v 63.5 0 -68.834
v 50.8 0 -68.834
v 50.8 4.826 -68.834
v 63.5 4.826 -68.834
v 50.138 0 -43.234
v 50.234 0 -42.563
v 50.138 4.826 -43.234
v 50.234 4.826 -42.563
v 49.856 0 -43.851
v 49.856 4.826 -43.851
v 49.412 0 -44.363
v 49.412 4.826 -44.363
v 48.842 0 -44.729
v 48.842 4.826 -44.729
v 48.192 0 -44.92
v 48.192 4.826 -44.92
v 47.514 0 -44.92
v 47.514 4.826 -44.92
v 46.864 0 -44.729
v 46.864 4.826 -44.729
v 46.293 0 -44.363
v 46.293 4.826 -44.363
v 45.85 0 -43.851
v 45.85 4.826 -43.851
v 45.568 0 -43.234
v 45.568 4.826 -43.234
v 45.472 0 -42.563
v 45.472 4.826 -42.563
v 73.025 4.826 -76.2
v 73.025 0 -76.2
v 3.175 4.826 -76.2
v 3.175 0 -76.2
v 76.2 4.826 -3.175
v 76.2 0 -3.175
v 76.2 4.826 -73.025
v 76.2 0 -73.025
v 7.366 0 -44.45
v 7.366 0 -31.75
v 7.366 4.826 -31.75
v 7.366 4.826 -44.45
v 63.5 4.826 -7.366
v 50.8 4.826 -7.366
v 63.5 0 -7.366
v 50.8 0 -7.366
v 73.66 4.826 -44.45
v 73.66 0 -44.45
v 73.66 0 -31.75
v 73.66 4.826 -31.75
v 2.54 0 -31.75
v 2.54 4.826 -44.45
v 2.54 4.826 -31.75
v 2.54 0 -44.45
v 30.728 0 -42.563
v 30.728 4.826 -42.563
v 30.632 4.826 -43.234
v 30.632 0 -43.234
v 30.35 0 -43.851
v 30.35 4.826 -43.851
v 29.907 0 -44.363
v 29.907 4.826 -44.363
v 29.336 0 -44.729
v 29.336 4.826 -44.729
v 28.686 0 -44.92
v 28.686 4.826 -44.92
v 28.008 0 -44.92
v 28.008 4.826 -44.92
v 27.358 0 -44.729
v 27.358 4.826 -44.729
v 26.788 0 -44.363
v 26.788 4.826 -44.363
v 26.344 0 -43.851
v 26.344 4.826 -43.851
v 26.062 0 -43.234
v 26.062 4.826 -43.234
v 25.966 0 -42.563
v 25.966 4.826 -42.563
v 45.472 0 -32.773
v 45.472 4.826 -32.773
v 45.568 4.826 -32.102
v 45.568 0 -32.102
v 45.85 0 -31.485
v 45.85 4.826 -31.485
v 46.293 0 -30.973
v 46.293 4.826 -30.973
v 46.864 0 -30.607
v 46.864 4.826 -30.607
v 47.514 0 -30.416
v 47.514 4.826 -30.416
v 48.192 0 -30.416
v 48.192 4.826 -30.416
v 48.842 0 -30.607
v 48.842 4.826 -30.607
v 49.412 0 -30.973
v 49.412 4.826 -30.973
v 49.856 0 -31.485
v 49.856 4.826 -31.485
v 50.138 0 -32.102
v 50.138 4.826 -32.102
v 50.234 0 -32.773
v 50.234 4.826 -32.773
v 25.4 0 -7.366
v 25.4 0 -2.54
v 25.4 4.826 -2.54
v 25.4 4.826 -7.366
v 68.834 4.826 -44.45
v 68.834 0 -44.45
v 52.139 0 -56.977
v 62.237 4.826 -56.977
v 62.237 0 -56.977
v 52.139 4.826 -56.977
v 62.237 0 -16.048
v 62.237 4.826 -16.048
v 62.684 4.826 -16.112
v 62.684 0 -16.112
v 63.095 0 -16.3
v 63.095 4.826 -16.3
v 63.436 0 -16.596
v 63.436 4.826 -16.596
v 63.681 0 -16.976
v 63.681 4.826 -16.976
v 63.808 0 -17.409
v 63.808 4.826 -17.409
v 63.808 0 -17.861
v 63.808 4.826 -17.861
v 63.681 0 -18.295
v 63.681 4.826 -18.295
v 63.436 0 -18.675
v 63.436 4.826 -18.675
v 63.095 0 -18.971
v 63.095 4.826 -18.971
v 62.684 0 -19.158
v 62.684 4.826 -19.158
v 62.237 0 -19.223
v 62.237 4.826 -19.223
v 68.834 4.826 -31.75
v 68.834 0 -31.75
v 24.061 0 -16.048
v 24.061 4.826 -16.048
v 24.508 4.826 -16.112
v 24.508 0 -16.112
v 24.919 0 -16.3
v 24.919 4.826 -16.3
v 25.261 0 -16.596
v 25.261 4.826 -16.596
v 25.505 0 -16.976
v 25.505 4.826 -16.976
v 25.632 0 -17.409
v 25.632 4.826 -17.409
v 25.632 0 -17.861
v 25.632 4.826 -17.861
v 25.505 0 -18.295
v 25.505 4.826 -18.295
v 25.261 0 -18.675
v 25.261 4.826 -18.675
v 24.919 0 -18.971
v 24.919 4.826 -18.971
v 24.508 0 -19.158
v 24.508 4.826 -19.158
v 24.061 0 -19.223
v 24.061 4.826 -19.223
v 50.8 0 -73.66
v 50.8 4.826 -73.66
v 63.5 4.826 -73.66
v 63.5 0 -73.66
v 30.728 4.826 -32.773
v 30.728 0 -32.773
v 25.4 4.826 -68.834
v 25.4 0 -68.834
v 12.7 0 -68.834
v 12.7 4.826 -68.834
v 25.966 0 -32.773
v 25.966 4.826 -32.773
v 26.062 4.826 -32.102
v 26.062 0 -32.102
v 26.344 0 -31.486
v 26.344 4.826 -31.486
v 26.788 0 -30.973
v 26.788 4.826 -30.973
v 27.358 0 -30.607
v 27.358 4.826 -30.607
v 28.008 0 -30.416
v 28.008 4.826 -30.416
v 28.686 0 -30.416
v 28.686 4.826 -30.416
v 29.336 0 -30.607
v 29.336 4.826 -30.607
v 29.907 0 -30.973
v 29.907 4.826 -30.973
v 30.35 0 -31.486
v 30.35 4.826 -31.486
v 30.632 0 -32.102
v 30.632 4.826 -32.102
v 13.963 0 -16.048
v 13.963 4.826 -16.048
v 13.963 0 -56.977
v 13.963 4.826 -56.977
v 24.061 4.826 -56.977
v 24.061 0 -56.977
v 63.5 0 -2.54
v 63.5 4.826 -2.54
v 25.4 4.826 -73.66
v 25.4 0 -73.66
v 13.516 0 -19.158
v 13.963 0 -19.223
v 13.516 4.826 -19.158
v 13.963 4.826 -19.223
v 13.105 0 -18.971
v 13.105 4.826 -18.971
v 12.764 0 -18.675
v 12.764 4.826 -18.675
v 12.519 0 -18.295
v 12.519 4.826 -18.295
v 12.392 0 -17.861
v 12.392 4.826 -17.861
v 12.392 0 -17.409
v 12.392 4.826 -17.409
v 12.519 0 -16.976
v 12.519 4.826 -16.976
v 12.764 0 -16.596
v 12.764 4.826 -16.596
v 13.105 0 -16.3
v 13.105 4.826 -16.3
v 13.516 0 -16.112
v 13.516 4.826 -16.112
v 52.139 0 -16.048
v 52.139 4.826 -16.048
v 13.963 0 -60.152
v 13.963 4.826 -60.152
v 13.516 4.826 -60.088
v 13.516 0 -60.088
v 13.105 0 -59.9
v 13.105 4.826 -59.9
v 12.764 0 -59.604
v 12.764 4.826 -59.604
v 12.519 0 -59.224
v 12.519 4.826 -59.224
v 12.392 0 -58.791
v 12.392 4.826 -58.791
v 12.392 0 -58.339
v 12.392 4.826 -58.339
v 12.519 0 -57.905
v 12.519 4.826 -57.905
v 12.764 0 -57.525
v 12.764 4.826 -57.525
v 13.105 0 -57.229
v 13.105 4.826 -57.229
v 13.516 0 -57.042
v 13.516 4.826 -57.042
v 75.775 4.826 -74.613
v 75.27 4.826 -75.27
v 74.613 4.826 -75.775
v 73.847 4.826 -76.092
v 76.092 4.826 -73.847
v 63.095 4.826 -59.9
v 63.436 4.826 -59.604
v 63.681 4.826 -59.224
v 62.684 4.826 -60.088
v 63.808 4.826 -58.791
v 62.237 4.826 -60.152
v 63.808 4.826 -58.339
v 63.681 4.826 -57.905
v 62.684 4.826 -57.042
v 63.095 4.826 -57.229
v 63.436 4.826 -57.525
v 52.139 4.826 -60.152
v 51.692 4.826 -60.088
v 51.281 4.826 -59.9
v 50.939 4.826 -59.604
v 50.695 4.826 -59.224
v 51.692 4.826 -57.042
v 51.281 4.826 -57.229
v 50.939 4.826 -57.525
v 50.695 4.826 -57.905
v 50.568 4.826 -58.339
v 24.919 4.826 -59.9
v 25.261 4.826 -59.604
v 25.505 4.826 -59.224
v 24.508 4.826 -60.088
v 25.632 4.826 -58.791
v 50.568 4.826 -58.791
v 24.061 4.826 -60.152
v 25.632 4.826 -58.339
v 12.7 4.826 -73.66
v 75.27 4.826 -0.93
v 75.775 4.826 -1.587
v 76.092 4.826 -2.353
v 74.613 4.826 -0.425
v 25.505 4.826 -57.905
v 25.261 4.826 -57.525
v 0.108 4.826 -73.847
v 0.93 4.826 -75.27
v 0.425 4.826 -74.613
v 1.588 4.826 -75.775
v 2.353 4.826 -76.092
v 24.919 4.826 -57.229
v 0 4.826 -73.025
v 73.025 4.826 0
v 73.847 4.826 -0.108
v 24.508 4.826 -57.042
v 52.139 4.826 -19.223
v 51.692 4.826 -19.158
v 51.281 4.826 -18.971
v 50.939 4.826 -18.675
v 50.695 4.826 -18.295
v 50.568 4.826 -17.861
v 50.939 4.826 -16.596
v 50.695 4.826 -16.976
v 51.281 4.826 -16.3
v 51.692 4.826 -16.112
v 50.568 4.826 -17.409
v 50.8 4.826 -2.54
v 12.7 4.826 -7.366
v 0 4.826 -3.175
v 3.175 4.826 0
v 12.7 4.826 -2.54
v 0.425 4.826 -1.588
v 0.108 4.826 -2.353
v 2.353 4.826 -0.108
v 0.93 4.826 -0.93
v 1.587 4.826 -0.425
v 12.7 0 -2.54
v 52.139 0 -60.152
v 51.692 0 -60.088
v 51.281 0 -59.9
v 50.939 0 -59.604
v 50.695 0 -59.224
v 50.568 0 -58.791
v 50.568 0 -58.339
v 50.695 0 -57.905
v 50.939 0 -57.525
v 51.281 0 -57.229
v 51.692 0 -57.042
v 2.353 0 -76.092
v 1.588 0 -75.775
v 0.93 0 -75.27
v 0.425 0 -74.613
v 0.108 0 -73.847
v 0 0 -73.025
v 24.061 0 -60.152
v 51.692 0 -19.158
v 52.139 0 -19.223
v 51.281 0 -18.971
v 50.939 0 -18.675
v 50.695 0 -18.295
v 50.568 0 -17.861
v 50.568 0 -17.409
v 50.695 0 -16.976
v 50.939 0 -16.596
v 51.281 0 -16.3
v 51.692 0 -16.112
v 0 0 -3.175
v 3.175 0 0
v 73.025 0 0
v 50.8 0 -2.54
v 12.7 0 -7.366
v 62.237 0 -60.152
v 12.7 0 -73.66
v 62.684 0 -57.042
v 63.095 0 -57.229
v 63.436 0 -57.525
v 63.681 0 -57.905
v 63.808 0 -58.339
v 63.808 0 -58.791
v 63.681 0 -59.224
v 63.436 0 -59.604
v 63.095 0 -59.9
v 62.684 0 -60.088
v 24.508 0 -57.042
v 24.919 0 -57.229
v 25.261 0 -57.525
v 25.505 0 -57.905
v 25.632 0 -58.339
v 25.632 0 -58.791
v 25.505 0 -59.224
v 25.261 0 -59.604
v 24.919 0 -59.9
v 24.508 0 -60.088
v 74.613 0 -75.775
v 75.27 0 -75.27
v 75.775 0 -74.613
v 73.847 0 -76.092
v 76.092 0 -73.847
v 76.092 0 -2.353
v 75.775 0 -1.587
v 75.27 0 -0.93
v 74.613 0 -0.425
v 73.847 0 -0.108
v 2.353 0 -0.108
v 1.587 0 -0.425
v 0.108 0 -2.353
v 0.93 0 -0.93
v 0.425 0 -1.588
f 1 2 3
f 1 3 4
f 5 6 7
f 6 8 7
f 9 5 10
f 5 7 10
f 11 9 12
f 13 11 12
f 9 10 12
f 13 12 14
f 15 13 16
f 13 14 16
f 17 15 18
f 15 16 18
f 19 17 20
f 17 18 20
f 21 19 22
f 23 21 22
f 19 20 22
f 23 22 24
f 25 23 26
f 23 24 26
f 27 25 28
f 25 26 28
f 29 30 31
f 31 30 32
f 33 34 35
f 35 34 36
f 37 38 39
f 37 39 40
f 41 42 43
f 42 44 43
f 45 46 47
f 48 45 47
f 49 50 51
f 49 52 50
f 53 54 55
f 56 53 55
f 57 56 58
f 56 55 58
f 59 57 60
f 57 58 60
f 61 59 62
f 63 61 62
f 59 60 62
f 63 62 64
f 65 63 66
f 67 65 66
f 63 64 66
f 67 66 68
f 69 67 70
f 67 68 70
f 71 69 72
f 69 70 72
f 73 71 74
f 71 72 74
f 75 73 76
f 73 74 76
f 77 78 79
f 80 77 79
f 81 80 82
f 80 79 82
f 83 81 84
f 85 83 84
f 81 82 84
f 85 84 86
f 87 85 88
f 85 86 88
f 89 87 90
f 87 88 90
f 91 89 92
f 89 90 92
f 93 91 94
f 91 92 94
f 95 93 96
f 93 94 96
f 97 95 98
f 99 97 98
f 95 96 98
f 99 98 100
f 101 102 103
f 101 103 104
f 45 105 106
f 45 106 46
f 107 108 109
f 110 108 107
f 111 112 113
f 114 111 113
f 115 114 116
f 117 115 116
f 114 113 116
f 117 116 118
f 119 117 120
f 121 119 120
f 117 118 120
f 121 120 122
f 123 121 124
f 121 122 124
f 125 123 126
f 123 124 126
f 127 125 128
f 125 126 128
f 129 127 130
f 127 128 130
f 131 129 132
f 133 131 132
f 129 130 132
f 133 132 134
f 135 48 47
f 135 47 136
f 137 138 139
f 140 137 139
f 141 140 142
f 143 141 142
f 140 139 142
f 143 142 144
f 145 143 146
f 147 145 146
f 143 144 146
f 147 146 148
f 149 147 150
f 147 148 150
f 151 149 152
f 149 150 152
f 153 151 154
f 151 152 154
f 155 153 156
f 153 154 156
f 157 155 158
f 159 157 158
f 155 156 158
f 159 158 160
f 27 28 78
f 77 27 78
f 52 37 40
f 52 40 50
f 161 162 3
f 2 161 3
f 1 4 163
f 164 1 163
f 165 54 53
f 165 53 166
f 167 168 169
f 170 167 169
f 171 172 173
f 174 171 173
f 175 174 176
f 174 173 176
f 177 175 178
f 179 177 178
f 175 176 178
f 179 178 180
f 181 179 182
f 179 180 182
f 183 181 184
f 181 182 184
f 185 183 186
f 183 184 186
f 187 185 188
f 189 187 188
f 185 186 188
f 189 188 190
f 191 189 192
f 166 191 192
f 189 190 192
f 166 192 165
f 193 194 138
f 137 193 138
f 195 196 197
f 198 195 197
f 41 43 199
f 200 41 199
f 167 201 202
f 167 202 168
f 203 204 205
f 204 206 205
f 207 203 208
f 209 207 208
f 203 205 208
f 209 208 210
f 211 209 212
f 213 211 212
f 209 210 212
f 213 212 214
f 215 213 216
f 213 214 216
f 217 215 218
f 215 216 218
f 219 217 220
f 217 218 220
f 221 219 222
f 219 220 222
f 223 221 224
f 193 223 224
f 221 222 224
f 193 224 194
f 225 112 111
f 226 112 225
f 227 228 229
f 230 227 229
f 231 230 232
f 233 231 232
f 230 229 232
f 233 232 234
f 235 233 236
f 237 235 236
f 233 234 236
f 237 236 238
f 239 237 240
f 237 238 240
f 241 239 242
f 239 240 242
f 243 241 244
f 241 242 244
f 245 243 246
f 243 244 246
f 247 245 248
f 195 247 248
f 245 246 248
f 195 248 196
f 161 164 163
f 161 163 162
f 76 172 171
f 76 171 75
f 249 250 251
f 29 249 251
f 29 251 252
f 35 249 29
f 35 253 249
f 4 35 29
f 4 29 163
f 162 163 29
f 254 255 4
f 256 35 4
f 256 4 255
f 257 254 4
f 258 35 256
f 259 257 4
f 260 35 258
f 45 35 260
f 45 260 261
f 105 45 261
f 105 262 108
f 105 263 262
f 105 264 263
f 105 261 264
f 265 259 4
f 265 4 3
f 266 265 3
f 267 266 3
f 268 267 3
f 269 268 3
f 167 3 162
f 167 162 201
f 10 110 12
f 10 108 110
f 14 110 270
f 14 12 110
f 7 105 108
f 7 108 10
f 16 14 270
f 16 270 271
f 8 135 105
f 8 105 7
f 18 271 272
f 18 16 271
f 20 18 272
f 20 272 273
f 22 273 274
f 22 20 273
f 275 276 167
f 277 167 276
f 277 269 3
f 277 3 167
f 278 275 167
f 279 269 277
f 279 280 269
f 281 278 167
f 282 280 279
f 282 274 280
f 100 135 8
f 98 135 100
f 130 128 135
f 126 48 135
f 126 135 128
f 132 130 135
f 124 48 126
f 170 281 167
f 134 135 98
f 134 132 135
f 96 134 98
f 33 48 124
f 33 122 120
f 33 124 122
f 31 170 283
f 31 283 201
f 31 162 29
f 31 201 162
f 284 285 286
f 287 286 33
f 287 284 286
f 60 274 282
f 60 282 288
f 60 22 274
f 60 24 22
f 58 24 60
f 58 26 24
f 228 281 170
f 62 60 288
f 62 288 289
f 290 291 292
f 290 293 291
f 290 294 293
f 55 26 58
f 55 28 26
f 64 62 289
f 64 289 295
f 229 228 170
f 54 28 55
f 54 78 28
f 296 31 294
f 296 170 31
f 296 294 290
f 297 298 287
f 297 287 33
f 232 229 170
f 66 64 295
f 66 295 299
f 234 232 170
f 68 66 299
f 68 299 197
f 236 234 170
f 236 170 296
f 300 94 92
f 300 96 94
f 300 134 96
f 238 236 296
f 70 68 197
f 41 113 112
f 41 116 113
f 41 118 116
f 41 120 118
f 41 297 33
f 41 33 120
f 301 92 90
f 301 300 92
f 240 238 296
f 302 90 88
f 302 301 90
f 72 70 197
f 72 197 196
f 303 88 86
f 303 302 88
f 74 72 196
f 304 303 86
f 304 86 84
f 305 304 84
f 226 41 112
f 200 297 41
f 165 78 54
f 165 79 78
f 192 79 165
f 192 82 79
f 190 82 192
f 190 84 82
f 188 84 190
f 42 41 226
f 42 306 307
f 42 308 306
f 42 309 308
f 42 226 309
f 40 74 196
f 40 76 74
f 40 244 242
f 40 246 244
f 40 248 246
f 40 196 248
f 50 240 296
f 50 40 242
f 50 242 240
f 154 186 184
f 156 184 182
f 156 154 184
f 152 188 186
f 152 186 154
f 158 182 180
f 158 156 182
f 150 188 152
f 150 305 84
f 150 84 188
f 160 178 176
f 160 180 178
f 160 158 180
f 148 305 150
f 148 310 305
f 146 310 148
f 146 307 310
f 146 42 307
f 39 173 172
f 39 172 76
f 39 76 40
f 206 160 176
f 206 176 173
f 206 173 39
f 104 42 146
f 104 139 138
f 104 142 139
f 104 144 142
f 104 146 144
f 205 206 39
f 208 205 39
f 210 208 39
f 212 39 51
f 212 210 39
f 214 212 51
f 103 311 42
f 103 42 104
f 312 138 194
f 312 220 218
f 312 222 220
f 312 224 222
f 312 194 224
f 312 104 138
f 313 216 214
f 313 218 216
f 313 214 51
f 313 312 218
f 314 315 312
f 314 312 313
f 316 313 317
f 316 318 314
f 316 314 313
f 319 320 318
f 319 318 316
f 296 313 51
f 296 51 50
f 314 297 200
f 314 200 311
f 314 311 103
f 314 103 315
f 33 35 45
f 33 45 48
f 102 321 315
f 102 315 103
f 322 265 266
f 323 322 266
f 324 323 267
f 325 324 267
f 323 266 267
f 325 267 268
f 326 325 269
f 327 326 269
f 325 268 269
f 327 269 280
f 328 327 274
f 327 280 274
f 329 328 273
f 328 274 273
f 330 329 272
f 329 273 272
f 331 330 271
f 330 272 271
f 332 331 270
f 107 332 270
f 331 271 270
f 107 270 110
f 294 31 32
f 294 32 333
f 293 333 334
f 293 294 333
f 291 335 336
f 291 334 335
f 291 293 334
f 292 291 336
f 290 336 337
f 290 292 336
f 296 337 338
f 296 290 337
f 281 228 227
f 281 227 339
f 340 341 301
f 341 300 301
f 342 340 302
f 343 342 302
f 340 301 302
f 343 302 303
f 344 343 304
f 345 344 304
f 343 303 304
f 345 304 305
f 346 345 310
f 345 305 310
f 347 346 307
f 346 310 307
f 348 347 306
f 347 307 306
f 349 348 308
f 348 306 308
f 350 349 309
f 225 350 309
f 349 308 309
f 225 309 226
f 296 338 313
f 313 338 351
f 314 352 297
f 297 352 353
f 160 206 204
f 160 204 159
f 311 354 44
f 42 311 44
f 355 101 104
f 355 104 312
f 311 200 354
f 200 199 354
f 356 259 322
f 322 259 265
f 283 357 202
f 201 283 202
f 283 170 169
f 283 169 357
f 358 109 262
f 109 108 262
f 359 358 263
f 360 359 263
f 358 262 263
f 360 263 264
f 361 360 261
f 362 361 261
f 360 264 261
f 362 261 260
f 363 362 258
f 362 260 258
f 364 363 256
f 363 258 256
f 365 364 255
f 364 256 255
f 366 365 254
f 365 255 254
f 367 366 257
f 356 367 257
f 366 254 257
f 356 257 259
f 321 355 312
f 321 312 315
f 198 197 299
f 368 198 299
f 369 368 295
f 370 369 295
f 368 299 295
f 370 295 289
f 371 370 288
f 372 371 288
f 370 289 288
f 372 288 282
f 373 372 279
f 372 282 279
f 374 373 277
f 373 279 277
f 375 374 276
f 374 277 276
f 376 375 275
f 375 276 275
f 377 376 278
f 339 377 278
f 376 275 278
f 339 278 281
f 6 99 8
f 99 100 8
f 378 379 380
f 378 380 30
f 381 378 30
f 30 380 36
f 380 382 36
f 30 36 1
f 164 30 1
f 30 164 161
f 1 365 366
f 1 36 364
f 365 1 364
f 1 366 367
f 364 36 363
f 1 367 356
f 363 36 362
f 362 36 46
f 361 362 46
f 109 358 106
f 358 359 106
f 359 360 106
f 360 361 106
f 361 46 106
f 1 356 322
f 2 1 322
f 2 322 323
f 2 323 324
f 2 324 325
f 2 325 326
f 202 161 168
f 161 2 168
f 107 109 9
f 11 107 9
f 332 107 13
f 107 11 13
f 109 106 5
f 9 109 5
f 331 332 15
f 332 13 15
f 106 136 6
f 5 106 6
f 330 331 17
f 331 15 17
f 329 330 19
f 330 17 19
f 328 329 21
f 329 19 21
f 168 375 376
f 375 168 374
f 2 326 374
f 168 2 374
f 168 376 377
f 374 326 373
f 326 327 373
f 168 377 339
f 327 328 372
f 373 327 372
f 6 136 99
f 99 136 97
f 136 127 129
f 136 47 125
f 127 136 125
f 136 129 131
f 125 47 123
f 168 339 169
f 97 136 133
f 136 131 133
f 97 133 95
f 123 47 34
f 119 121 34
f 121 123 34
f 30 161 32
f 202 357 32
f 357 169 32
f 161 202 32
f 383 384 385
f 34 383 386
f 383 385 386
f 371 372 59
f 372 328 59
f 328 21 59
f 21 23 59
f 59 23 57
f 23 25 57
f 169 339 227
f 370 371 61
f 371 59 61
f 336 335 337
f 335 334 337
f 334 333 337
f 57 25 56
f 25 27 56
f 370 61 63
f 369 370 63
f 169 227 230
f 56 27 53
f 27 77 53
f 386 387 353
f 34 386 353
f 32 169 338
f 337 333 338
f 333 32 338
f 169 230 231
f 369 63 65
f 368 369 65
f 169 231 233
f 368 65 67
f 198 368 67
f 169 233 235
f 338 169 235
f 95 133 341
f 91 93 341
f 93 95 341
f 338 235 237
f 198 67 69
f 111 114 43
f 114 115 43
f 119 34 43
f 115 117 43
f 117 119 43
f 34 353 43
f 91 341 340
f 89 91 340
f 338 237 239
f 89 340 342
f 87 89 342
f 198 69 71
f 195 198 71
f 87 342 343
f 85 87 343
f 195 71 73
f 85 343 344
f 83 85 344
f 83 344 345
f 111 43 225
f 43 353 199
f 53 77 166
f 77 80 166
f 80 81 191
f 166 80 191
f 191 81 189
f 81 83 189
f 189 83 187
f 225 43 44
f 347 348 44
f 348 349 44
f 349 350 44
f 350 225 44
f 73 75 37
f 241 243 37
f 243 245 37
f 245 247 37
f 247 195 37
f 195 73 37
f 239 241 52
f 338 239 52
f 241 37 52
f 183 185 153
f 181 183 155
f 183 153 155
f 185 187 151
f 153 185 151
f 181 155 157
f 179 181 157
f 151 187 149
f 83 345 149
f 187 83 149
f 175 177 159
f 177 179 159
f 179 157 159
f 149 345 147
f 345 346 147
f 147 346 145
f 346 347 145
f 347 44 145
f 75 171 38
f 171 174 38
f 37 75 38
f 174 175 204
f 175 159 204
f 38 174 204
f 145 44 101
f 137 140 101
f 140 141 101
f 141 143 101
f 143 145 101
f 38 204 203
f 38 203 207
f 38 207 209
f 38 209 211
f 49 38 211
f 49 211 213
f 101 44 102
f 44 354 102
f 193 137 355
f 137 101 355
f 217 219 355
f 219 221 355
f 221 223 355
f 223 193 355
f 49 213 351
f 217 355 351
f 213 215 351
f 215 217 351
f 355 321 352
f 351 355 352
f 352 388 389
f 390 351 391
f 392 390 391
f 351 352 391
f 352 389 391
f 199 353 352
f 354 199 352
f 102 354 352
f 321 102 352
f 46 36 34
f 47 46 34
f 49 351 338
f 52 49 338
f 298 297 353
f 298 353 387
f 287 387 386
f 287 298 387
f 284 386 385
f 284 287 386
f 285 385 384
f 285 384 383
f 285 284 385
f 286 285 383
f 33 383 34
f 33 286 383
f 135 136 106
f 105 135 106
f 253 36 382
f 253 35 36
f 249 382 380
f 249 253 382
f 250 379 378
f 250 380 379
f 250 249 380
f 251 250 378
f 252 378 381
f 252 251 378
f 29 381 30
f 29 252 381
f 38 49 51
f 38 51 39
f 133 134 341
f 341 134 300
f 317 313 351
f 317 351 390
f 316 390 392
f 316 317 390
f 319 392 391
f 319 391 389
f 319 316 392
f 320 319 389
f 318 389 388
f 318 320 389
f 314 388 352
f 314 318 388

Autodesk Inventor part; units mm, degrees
ref_plane "YZ Plane" through (0, 0, 0) normal (1, 0, 0) x (0, 1, 0)
ref_plane "XZ Plane" through (0, 0, 0) normal (0, 1, 0) x (-1, 0, 0)
ref_plane "XY Plane" through (0, 0, 0) normal (0, 0, 1) x (1, 0, 0)
sketch "Sketch1" plane through (0, 0, 0) normal (0, 1, 0) x (-1, 0, 0)
  line L0 (0, 0) -> (-76.2, 0)
  line L1 (-76.2, 0) -> (-76.2, -76.2)
  line L2 (-76.2, -76.2) -> (0, -76.2)
  line L3 (0, -76.2) -> (0, 0)
  line L4 (-12.7, -2.54) -> (-25.4, -2.54)
  line L5 (-25.4, -2.54) -> (-25.4, -7.366)
  line L6 (-25.4, -7.366) -> (-12.7, -7.366)
  line L7 (-12.7, -7.366) -> (-12.7, -2.54)
  line L8 (-38.1, 0) -> (-38.1, -76.2)
  line L9 (0, -38.1) -> (-76.2, -38.1)
  line L10 (-12.7, -73.66) -> (-25.4, -73.66)
  line L11 (-25.4, -73.66) -> (-25.4, -68.834)
  line L12 (-25.4, -68.834) -> (-12.7, -68.834)
  line L13 (-12.7, -68.834) -> (-12.7, -73.66)
  line L14 (-63.5, -2.54) -> (-50.8, -2.54)
  line L15 (-50.8, -2.54) -> (-50.8, -7.366)
  line L16 (-50.8, -7.366) -> (-63.5, -7.366)
  line L17 (-63.5, -7.366) -> (-63.5, -2.54)
  line L18 (-63.5, -73.66) -> (-50.8, -73.66)
  line L19 (-50.8, -73.66) -> (-50.8, -68.834)
  line L20 (-50.8, -68.834) -> (-63.5, -68.834)
  line L21 (-63.5, -68.834) -> (-63.5, -73.66)
  line L22 (-68.834, -31.75) -> (-68.834, -44.45)
  line L23 (-68.834, -44.45) -> (-73.66, -44.45)
  line L24 (-73.66, -31.75) -> (-68.834, -31.75)
  line L25 (-73.66, -44.45) -> (-73.66, -31.75)
  line L26 (-7.366, -44.45) -> (-2.54, -44.45)
  line L27 (-7.366, -31.75) -> (-7.366, -44.45)
  line L28 (-2.54, -44.45) -> (-2.54, -31.75)
  line L29 (-2.54, -31.75) -> (-7.366, -31.75)
  dimension "d0" = 76.2
  dimension "d1" = 76.2
  dimension "d2" = 12.7
  dimension "d3" = 4.826
  dimension "d4" = 2.54
  dimension "d5" = 12.7
  dimension "d6" = 31.75
  dimension "d7" = 2.54
  dimension "d8" = 4.826
  dimension "d9" = 12.7
extrude "Extrusion1" add sketch "Sketch1" along normal blind 4.826 contours L3 L9 L28 L29 L27 L8 L0 | L8 L9 L22 L24 L25 L1 L0 | L3 L2 L8 L9 L27 L26 L28 | L8 L2 L1 L9 L25 L23 L22
sketch "Sketch3" plane through (0, 4.826, 0) normal (0, 1, 0) x (1, 0, 0)
  arc A0 (62.2366, 56.9773) -> (62.2366, 60.1523) centre (62.2366, 58.5648) ccw
  arc A1 (52.1392, 60.1523) -> (52.1392, 56.9773) centre (52.1392, 58.5648) ccw
  line L0 (62.2366, 60.1523) -> (52.1392, 60.1523)
  line L1 (62.2366, 56.9773) -> (52.1392, 56.9773)
  line L2 (76.2, 0) -> (76.2, 76.2) projected
  line L3 (76.2, 38.1) -> (0, 38.1)
  line L4 (0, 76.2) -> (0, 0) projected
  line L5 (76.2, 76.2) -> (0, 76.2) projected
  line L6 (38.1, 76.2) -> (38.1, 0)
  arc A2 (62.2366, 16.0477) -> (62.2366, 19.2227) centre (62.2366, 17.6352) ccw
  arc A3 (52.1392, 19.2227) -> (52.1392, 16.0477) centre (52.1392, 17.6352) ccw
  line L7 (62.2366, 16.0477) -> (52.1392, 16.0477)
  line L8 (62.2366, 19.2227) -> (52.1392, 19.2227)
  arc A4 (13.9634, 60.1523) -> (13.9634, 56.9773) centre (13.9634, 58.5648) ccw
  arc A5 (24.0608, 56.9773) -> (24.0608, 60.1523) centre (24.0608, 58.5648) ccw
  line L9 (13.9634, 60.1523) -> (24.0608, 60.1523)
  line L10 (13.9634, 56.9773) -> (24.0608, 56.9773)
  arc A6 (13.9634, 19.2227) -> (13.9634, 16.0477) centre (13.9634, 17.6352) ccw
  arc A7 (24.0608, 16.0477) -> (24.0608, 19.2227) centre (24.0608, 17.6352) ccw
  line L11 (13.9634, 16.0477) -> (24.0608, 16.0477)
  line L12 (13.9634, 19.2227) -> (24.0608, 19.2227)
  arc A8 (25.9659, 32.7729) -> (30.7284, 32.7729) centre (28.3471, 32.7729) ccw
  arc A9 (30.7284, 42.5632) -> (25.9659, 42.5632) centre (28.3471, 42.5632) ccw
  line L13 (25.9659, 32.7729) -> (25.9659, 42.5632)
  line L14 (30.7284, 42.5632) -> (30.7284, 32.7729)
  arc A10 (45.4716, 32.7729) -> (50.2341, 32.7729) centre (47.8529, 32.7729) ccw
  arc A11 (50.2341, 42.5632) -> (45.4716, 42.5632) centre (47.8529, 42.5632) ccw
  line L15 (50.2341, 32.7729) -> (50.2341, 42.5632)
  line L16 (45.4716, 42.5632) -> (45.4716, 32.7729)
  dimension "d12" = 3.175
  dimension "d13" = 3.175
  dimension "d16" = 4.7625
  dimension "d17" = 4.7625
extrude "Extrusion3" cut sketch "Sketch3" against normal blind 4.826 contours L1 A1 L0 A0 | L15 A10 L16 L3 | L3 L16 A11 L15 | L14 A8 L13 L3 | L3 L13 A9 L14 | L7 A3 L8 A2 | L9 A5 L10 A4 | L12 A7 L11 A6
fillet "Fillet1" radius 3.175 4 edges at (76.2, 2.413, 0) (76.2, 2.413, -76.2) (0, 2.413, 0) (0, 2.413, -76.2)
properties part number "bottom"
